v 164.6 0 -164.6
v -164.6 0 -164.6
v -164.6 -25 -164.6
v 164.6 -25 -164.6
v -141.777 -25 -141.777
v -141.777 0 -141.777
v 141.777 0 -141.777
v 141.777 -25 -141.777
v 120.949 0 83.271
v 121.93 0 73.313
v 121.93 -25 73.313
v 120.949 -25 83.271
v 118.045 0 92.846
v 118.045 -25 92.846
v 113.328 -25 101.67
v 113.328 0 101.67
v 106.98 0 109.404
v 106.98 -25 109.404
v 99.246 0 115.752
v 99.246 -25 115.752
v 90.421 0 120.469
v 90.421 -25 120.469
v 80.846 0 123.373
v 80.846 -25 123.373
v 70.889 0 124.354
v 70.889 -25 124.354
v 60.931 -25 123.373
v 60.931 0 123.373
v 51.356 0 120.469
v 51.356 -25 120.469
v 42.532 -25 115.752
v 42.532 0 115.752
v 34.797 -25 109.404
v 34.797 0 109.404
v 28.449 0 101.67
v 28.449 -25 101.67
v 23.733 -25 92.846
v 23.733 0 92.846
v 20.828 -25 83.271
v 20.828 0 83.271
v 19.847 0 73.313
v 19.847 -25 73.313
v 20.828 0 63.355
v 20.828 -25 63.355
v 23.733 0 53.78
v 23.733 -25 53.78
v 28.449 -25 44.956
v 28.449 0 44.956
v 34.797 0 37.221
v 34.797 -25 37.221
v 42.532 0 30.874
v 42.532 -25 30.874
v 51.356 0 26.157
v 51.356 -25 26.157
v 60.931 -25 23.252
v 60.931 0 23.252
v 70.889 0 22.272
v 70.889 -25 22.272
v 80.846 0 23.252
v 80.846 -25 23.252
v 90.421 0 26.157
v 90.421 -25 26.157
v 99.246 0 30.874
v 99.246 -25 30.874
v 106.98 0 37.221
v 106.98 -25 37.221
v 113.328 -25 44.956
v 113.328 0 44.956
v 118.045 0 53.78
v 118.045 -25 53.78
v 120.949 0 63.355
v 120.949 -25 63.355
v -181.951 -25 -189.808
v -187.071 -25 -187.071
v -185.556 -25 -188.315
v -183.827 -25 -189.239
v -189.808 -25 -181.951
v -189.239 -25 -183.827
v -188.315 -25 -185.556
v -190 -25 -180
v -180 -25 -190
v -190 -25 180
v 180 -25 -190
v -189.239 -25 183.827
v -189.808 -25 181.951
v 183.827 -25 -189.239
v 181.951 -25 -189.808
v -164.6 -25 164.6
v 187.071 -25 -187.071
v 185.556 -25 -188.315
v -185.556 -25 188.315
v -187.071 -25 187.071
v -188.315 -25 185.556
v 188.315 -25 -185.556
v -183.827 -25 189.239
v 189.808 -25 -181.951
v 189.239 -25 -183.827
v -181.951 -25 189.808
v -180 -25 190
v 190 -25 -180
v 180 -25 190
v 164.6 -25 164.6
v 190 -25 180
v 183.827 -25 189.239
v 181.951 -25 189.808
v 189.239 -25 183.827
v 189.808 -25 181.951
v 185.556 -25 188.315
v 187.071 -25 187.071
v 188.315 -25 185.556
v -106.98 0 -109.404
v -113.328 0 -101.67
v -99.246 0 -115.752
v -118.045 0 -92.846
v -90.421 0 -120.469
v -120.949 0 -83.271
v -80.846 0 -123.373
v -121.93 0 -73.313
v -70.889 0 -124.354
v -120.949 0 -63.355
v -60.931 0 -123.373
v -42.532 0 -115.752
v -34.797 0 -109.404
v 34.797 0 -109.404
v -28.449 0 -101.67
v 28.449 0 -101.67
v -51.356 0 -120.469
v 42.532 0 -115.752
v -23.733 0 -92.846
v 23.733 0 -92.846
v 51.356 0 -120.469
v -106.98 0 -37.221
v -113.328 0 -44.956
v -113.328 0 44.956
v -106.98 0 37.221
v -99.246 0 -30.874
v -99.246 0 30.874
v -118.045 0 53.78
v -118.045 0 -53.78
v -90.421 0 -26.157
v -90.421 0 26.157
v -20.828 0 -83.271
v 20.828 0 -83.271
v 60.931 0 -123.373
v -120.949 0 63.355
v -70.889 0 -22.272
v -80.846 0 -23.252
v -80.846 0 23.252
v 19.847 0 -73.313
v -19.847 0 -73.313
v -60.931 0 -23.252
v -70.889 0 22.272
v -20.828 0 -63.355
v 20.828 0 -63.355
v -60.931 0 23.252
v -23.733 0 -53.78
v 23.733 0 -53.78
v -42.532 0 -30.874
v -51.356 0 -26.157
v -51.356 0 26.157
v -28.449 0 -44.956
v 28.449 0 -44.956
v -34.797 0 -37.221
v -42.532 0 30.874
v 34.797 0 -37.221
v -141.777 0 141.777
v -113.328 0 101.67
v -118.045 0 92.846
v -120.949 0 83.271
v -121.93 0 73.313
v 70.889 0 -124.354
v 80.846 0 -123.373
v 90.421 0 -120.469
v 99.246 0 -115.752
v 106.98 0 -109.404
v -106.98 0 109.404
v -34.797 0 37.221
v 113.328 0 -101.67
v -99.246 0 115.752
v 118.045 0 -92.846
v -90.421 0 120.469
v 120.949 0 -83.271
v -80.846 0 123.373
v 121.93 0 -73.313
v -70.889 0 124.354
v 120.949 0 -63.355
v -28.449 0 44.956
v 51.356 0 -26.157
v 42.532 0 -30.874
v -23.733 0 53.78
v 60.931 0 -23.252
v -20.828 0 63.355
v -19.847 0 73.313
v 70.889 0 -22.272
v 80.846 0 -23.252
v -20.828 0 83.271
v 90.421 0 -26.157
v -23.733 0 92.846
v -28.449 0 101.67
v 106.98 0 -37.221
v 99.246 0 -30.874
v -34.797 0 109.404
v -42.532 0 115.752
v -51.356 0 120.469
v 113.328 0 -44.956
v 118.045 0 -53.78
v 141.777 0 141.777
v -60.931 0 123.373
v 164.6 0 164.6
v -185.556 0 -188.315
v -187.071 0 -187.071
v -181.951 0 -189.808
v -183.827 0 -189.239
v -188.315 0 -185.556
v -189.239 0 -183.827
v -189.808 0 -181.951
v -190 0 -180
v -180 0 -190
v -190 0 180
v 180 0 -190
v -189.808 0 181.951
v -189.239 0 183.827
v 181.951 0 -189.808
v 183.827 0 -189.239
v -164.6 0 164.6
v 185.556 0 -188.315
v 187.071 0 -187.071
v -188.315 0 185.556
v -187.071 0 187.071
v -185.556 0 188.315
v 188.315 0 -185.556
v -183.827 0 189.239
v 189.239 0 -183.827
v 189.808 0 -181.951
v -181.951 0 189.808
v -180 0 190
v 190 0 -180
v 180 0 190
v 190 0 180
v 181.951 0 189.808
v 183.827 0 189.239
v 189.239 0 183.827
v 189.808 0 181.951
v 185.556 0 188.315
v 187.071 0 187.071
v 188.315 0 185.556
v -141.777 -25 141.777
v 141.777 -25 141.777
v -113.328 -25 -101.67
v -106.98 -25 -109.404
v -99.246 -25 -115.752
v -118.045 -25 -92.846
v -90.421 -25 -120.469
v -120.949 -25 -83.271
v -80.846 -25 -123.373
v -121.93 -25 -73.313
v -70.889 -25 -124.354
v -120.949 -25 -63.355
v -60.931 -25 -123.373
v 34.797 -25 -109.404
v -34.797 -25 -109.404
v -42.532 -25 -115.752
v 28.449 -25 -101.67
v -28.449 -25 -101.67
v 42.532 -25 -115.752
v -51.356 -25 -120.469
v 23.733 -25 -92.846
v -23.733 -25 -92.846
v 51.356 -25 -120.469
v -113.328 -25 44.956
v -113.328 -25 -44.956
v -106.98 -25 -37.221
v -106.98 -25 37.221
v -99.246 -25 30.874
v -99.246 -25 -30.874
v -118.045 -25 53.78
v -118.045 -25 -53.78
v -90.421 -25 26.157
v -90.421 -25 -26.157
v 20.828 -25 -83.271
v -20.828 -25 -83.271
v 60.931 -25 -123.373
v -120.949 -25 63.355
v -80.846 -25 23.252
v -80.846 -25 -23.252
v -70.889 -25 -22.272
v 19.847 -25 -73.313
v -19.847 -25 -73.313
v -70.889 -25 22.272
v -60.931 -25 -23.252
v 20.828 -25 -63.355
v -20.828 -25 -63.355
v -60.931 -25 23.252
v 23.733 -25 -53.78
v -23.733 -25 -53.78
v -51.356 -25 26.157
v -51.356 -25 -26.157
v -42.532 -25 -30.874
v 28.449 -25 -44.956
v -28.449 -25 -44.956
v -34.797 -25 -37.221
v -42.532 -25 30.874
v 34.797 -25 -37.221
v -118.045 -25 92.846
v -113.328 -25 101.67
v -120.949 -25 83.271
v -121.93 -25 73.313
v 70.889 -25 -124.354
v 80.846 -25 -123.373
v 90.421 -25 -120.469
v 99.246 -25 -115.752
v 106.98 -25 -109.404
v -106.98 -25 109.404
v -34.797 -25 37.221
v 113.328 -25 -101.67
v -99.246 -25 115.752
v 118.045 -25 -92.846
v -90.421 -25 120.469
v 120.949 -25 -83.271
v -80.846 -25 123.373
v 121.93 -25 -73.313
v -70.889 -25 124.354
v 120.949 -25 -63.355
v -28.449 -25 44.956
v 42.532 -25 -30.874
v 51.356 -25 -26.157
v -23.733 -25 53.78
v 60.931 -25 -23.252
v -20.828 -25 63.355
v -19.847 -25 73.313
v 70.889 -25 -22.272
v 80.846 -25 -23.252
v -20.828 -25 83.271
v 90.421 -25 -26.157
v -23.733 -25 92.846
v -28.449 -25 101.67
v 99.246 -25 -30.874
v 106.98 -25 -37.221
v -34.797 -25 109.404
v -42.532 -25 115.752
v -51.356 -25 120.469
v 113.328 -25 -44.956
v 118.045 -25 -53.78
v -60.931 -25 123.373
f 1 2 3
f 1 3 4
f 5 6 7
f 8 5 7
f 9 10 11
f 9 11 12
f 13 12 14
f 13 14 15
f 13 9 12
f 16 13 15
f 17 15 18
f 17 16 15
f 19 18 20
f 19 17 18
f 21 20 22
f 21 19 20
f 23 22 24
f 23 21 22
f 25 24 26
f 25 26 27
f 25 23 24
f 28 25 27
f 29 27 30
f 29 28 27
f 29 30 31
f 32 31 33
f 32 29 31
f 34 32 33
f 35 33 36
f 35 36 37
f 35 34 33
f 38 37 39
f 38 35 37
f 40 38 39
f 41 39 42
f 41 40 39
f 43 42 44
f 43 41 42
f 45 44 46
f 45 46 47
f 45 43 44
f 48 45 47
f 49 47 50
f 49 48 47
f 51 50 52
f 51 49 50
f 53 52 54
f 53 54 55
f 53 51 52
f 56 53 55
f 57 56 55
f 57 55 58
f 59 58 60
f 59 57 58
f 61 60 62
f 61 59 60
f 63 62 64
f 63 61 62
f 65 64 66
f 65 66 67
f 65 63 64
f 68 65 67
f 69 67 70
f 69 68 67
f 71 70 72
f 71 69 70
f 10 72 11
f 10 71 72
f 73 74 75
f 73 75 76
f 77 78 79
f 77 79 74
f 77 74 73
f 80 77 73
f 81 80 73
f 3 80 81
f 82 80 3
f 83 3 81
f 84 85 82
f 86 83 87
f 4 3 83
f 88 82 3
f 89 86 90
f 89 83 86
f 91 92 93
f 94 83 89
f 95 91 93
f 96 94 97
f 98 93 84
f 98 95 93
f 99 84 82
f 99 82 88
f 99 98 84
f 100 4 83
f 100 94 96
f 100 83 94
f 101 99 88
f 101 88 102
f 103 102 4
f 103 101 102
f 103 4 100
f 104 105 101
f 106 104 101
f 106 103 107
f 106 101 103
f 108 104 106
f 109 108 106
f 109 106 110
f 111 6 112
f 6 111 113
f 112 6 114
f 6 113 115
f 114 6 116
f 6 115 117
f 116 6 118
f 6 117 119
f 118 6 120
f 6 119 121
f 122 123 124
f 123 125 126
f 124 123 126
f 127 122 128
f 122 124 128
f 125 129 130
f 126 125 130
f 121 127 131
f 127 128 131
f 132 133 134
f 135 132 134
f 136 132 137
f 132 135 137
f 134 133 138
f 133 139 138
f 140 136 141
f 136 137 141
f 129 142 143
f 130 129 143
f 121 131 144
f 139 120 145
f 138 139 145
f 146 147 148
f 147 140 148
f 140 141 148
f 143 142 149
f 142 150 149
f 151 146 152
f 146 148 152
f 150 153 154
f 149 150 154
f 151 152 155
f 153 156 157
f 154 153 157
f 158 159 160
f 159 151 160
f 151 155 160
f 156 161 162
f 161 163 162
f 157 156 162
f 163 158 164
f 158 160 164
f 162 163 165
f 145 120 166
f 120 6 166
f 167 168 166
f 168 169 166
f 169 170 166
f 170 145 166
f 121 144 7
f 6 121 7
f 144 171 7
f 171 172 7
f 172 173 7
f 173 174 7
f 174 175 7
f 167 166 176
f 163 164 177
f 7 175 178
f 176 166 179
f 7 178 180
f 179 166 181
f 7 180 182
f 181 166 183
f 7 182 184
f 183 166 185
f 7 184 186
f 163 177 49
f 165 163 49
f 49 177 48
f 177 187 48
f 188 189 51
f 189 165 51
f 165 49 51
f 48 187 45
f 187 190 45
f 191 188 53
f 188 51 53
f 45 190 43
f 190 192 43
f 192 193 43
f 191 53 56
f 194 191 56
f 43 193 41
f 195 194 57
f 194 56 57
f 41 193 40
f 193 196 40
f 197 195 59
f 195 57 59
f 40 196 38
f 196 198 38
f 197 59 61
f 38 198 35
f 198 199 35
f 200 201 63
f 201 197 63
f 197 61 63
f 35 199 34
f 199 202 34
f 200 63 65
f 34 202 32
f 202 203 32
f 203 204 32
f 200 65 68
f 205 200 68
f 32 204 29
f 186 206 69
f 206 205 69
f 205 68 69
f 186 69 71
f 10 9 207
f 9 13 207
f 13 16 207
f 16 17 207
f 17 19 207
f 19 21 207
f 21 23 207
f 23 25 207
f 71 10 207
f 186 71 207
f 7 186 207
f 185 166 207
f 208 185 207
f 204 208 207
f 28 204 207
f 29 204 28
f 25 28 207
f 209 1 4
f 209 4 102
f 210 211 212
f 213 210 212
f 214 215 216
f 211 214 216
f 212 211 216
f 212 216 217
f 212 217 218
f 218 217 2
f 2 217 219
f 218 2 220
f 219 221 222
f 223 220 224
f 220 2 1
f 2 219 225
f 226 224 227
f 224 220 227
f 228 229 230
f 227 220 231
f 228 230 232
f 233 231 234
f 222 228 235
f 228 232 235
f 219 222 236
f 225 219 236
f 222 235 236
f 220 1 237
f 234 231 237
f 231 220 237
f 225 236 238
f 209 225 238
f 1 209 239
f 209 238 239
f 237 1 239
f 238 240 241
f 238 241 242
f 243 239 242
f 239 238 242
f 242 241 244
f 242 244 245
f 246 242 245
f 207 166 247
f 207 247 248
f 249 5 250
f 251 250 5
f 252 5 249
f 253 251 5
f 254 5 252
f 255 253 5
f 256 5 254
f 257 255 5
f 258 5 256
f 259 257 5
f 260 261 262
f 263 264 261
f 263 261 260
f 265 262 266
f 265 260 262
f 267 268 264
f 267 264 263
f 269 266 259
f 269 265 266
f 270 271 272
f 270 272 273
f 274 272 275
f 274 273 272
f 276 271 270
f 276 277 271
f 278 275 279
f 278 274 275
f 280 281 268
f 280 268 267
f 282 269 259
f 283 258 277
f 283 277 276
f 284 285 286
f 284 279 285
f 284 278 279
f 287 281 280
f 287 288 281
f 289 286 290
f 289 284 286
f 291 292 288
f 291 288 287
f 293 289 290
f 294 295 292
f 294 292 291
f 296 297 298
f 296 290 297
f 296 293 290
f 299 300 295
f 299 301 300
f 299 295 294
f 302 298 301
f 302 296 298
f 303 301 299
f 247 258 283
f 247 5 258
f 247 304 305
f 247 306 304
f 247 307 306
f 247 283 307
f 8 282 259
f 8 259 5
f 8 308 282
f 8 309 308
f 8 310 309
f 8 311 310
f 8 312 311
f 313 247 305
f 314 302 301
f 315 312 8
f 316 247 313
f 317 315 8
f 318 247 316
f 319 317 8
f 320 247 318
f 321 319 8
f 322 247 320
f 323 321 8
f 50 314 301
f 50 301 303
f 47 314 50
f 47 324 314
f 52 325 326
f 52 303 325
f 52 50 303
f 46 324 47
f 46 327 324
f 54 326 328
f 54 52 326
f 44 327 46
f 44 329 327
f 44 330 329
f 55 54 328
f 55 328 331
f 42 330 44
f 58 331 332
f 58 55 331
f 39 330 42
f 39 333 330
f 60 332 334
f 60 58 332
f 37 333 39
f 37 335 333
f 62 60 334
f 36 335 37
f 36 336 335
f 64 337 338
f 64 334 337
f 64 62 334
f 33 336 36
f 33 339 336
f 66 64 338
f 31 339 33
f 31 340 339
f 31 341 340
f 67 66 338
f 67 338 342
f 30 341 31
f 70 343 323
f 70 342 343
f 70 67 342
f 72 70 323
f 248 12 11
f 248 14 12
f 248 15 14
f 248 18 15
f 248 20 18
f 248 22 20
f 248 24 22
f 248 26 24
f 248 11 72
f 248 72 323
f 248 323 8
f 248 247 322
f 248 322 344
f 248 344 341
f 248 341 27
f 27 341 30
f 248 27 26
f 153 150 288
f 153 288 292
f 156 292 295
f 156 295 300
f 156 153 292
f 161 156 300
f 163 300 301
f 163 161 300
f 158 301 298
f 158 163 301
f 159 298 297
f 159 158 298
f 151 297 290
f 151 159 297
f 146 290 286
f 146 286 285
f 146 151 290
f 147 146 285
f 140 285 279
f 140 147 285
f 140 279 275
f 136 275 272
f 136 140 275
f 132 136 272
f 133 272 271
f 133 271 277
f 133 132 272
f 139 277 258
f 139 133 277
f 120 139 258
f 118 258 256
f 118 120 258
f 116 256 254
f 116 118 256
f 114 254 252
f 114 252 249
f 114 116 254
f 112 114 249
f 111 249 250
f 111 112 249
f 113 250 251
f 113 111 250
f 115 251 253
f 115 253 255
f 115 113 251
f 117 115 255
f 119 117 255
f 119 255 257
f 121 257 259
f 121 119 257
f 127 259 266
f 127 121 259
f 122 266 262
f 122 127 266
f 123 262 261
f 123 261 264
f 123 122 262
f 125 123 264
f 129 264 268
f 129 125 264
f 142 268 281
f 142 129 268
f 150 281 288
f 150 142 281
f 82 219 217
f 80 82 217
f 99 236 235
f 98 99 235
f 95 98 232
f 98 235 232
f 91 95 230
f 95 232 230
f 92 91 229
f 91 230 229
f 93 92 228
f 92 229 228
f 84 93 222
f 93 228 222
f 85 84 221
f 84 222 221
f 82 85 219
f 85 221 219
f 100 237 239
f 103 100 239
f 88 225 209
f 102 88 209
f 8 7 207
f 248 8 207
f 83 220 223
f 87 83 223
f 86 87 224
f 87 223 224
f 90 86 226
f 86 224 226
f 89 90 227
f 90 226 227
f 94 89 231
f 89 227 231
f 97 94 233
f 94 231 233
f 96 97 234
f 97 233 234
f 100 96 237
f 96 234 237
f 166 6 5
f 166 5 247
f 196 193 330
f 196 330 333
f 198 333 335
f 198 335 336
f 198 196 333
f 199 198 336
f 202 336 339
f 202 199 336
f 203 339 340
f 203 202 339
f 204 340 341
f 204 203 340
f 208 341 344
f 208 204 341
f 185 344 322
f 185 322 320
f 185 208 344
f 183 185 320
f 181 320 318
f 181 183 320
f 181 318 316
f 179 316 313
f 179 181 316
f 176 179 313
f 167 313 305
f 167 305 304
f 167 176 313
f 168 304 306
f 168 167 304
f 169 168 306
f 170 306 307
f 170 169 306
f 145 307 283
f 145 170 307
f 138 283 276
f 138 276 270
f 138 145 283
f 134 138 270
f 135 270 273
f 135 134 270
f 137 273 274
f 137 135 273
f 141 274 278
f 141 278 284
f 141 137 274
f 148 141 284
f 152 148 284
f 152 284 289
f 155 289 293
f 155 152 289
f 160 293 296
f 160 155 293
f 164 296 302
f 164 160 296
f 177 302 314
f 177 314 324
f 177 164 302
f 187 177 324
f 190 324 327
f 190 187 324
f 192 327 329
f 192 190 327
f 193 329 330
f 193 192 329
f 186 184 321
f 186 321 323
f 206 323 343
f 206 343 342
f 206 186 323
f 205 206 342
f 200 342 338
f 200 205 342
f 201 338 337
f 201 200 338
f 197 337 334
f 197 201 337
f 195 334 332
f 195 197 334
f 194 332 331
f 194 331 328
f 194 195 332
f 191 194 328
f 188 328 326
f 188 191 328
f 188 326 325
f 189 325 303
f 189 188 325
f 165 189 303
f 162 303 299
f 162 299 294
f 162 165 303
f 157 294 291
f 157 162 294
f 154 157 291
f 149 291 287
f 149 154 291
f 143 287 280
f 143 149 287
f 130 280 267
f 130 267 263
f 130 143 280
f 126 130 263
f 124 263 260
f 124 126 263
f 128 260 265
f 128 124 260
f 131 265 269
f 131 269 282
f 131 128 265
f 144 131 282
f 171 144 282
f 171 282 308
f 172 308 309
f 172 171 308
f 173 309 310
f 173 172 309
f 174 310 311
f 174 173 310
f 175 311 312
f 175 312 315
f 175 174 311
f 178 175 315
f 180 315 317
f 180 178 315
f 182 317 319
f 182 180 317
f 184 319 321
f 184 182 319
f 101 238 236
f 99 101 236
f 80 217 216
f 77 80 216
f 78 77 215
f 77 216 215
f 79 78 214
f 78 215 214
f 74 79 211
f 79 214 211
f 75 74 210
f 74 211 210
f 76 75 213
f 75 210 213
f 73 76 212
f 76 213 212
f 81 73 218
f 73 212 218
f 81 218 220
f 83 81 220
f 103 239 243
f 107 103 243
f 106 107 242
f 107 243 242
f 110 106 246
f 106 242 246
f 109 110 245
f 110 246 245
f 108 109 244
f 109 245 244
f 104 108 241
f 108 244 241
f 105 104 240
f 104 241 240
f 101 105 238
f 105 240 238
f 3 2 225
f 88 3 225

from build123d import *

# Parameters (mm, degrees)
F0_W     = 354.6
F0_H     = 354.6
F0_W_2   = 329.2
F0_H_2   = 329.2
F0_W_3   = 283.554444
F0_H_3   = 283.554444
F0_R     = 51.041172
F1_DEPTH = 25


with BuildPart() as f1:
    # F0 (on Front) → F1 (new body)
    with BuildSketch(Plane.XZ):
        with BuildLine():
            Line((180, 190), (-180, 190))
            ThreePointArc((-180, 190), (-187.071068, 187.071068), (-190, 180))
            Line((-190, 180), (-190, -180))
            ThreePointArc((-190, -180), (-187.071068, -187.071068), (-180, -190))
            Line((-180, -190), (180, -190))
            ThreePointArc((180, -190), (187.071068, -187.071068), (190, -180))
            Line((190, -180), (190, 180))
            ThreePointArc((190, 180), (187.071068, 187.071068), (180, 190))
        make_face()
        Rectangle(F0_W, F0_H, mode=Mode.SUBTRACT)
        Rectangle(F0_W, F0_H)
        Rectangle(F0_W_2, F0_H_2, mode=Mode.SUBTRACT)
        Rectangle(F0_W_3, F0_H_3)
        with Locations((-70.888611, -73.312916)):
            Circle(F0_R, mode=Mode.SUBTRACT)
        with Locations((70.888611, -73.312916)):
            Circle(F0_R, mode=Mode.SUBTRACT)
        with Locations((-70.888611, 73.312916)):
            Circle(F0_R, mode=Mode.SUBTRACT)
        with Locations((70.888611, 73.312916)):
            Circle(F0_R, mode=Mode.SUBTRACT)
    extrude(amount=F1_DEPTH)


solid = f1.part
